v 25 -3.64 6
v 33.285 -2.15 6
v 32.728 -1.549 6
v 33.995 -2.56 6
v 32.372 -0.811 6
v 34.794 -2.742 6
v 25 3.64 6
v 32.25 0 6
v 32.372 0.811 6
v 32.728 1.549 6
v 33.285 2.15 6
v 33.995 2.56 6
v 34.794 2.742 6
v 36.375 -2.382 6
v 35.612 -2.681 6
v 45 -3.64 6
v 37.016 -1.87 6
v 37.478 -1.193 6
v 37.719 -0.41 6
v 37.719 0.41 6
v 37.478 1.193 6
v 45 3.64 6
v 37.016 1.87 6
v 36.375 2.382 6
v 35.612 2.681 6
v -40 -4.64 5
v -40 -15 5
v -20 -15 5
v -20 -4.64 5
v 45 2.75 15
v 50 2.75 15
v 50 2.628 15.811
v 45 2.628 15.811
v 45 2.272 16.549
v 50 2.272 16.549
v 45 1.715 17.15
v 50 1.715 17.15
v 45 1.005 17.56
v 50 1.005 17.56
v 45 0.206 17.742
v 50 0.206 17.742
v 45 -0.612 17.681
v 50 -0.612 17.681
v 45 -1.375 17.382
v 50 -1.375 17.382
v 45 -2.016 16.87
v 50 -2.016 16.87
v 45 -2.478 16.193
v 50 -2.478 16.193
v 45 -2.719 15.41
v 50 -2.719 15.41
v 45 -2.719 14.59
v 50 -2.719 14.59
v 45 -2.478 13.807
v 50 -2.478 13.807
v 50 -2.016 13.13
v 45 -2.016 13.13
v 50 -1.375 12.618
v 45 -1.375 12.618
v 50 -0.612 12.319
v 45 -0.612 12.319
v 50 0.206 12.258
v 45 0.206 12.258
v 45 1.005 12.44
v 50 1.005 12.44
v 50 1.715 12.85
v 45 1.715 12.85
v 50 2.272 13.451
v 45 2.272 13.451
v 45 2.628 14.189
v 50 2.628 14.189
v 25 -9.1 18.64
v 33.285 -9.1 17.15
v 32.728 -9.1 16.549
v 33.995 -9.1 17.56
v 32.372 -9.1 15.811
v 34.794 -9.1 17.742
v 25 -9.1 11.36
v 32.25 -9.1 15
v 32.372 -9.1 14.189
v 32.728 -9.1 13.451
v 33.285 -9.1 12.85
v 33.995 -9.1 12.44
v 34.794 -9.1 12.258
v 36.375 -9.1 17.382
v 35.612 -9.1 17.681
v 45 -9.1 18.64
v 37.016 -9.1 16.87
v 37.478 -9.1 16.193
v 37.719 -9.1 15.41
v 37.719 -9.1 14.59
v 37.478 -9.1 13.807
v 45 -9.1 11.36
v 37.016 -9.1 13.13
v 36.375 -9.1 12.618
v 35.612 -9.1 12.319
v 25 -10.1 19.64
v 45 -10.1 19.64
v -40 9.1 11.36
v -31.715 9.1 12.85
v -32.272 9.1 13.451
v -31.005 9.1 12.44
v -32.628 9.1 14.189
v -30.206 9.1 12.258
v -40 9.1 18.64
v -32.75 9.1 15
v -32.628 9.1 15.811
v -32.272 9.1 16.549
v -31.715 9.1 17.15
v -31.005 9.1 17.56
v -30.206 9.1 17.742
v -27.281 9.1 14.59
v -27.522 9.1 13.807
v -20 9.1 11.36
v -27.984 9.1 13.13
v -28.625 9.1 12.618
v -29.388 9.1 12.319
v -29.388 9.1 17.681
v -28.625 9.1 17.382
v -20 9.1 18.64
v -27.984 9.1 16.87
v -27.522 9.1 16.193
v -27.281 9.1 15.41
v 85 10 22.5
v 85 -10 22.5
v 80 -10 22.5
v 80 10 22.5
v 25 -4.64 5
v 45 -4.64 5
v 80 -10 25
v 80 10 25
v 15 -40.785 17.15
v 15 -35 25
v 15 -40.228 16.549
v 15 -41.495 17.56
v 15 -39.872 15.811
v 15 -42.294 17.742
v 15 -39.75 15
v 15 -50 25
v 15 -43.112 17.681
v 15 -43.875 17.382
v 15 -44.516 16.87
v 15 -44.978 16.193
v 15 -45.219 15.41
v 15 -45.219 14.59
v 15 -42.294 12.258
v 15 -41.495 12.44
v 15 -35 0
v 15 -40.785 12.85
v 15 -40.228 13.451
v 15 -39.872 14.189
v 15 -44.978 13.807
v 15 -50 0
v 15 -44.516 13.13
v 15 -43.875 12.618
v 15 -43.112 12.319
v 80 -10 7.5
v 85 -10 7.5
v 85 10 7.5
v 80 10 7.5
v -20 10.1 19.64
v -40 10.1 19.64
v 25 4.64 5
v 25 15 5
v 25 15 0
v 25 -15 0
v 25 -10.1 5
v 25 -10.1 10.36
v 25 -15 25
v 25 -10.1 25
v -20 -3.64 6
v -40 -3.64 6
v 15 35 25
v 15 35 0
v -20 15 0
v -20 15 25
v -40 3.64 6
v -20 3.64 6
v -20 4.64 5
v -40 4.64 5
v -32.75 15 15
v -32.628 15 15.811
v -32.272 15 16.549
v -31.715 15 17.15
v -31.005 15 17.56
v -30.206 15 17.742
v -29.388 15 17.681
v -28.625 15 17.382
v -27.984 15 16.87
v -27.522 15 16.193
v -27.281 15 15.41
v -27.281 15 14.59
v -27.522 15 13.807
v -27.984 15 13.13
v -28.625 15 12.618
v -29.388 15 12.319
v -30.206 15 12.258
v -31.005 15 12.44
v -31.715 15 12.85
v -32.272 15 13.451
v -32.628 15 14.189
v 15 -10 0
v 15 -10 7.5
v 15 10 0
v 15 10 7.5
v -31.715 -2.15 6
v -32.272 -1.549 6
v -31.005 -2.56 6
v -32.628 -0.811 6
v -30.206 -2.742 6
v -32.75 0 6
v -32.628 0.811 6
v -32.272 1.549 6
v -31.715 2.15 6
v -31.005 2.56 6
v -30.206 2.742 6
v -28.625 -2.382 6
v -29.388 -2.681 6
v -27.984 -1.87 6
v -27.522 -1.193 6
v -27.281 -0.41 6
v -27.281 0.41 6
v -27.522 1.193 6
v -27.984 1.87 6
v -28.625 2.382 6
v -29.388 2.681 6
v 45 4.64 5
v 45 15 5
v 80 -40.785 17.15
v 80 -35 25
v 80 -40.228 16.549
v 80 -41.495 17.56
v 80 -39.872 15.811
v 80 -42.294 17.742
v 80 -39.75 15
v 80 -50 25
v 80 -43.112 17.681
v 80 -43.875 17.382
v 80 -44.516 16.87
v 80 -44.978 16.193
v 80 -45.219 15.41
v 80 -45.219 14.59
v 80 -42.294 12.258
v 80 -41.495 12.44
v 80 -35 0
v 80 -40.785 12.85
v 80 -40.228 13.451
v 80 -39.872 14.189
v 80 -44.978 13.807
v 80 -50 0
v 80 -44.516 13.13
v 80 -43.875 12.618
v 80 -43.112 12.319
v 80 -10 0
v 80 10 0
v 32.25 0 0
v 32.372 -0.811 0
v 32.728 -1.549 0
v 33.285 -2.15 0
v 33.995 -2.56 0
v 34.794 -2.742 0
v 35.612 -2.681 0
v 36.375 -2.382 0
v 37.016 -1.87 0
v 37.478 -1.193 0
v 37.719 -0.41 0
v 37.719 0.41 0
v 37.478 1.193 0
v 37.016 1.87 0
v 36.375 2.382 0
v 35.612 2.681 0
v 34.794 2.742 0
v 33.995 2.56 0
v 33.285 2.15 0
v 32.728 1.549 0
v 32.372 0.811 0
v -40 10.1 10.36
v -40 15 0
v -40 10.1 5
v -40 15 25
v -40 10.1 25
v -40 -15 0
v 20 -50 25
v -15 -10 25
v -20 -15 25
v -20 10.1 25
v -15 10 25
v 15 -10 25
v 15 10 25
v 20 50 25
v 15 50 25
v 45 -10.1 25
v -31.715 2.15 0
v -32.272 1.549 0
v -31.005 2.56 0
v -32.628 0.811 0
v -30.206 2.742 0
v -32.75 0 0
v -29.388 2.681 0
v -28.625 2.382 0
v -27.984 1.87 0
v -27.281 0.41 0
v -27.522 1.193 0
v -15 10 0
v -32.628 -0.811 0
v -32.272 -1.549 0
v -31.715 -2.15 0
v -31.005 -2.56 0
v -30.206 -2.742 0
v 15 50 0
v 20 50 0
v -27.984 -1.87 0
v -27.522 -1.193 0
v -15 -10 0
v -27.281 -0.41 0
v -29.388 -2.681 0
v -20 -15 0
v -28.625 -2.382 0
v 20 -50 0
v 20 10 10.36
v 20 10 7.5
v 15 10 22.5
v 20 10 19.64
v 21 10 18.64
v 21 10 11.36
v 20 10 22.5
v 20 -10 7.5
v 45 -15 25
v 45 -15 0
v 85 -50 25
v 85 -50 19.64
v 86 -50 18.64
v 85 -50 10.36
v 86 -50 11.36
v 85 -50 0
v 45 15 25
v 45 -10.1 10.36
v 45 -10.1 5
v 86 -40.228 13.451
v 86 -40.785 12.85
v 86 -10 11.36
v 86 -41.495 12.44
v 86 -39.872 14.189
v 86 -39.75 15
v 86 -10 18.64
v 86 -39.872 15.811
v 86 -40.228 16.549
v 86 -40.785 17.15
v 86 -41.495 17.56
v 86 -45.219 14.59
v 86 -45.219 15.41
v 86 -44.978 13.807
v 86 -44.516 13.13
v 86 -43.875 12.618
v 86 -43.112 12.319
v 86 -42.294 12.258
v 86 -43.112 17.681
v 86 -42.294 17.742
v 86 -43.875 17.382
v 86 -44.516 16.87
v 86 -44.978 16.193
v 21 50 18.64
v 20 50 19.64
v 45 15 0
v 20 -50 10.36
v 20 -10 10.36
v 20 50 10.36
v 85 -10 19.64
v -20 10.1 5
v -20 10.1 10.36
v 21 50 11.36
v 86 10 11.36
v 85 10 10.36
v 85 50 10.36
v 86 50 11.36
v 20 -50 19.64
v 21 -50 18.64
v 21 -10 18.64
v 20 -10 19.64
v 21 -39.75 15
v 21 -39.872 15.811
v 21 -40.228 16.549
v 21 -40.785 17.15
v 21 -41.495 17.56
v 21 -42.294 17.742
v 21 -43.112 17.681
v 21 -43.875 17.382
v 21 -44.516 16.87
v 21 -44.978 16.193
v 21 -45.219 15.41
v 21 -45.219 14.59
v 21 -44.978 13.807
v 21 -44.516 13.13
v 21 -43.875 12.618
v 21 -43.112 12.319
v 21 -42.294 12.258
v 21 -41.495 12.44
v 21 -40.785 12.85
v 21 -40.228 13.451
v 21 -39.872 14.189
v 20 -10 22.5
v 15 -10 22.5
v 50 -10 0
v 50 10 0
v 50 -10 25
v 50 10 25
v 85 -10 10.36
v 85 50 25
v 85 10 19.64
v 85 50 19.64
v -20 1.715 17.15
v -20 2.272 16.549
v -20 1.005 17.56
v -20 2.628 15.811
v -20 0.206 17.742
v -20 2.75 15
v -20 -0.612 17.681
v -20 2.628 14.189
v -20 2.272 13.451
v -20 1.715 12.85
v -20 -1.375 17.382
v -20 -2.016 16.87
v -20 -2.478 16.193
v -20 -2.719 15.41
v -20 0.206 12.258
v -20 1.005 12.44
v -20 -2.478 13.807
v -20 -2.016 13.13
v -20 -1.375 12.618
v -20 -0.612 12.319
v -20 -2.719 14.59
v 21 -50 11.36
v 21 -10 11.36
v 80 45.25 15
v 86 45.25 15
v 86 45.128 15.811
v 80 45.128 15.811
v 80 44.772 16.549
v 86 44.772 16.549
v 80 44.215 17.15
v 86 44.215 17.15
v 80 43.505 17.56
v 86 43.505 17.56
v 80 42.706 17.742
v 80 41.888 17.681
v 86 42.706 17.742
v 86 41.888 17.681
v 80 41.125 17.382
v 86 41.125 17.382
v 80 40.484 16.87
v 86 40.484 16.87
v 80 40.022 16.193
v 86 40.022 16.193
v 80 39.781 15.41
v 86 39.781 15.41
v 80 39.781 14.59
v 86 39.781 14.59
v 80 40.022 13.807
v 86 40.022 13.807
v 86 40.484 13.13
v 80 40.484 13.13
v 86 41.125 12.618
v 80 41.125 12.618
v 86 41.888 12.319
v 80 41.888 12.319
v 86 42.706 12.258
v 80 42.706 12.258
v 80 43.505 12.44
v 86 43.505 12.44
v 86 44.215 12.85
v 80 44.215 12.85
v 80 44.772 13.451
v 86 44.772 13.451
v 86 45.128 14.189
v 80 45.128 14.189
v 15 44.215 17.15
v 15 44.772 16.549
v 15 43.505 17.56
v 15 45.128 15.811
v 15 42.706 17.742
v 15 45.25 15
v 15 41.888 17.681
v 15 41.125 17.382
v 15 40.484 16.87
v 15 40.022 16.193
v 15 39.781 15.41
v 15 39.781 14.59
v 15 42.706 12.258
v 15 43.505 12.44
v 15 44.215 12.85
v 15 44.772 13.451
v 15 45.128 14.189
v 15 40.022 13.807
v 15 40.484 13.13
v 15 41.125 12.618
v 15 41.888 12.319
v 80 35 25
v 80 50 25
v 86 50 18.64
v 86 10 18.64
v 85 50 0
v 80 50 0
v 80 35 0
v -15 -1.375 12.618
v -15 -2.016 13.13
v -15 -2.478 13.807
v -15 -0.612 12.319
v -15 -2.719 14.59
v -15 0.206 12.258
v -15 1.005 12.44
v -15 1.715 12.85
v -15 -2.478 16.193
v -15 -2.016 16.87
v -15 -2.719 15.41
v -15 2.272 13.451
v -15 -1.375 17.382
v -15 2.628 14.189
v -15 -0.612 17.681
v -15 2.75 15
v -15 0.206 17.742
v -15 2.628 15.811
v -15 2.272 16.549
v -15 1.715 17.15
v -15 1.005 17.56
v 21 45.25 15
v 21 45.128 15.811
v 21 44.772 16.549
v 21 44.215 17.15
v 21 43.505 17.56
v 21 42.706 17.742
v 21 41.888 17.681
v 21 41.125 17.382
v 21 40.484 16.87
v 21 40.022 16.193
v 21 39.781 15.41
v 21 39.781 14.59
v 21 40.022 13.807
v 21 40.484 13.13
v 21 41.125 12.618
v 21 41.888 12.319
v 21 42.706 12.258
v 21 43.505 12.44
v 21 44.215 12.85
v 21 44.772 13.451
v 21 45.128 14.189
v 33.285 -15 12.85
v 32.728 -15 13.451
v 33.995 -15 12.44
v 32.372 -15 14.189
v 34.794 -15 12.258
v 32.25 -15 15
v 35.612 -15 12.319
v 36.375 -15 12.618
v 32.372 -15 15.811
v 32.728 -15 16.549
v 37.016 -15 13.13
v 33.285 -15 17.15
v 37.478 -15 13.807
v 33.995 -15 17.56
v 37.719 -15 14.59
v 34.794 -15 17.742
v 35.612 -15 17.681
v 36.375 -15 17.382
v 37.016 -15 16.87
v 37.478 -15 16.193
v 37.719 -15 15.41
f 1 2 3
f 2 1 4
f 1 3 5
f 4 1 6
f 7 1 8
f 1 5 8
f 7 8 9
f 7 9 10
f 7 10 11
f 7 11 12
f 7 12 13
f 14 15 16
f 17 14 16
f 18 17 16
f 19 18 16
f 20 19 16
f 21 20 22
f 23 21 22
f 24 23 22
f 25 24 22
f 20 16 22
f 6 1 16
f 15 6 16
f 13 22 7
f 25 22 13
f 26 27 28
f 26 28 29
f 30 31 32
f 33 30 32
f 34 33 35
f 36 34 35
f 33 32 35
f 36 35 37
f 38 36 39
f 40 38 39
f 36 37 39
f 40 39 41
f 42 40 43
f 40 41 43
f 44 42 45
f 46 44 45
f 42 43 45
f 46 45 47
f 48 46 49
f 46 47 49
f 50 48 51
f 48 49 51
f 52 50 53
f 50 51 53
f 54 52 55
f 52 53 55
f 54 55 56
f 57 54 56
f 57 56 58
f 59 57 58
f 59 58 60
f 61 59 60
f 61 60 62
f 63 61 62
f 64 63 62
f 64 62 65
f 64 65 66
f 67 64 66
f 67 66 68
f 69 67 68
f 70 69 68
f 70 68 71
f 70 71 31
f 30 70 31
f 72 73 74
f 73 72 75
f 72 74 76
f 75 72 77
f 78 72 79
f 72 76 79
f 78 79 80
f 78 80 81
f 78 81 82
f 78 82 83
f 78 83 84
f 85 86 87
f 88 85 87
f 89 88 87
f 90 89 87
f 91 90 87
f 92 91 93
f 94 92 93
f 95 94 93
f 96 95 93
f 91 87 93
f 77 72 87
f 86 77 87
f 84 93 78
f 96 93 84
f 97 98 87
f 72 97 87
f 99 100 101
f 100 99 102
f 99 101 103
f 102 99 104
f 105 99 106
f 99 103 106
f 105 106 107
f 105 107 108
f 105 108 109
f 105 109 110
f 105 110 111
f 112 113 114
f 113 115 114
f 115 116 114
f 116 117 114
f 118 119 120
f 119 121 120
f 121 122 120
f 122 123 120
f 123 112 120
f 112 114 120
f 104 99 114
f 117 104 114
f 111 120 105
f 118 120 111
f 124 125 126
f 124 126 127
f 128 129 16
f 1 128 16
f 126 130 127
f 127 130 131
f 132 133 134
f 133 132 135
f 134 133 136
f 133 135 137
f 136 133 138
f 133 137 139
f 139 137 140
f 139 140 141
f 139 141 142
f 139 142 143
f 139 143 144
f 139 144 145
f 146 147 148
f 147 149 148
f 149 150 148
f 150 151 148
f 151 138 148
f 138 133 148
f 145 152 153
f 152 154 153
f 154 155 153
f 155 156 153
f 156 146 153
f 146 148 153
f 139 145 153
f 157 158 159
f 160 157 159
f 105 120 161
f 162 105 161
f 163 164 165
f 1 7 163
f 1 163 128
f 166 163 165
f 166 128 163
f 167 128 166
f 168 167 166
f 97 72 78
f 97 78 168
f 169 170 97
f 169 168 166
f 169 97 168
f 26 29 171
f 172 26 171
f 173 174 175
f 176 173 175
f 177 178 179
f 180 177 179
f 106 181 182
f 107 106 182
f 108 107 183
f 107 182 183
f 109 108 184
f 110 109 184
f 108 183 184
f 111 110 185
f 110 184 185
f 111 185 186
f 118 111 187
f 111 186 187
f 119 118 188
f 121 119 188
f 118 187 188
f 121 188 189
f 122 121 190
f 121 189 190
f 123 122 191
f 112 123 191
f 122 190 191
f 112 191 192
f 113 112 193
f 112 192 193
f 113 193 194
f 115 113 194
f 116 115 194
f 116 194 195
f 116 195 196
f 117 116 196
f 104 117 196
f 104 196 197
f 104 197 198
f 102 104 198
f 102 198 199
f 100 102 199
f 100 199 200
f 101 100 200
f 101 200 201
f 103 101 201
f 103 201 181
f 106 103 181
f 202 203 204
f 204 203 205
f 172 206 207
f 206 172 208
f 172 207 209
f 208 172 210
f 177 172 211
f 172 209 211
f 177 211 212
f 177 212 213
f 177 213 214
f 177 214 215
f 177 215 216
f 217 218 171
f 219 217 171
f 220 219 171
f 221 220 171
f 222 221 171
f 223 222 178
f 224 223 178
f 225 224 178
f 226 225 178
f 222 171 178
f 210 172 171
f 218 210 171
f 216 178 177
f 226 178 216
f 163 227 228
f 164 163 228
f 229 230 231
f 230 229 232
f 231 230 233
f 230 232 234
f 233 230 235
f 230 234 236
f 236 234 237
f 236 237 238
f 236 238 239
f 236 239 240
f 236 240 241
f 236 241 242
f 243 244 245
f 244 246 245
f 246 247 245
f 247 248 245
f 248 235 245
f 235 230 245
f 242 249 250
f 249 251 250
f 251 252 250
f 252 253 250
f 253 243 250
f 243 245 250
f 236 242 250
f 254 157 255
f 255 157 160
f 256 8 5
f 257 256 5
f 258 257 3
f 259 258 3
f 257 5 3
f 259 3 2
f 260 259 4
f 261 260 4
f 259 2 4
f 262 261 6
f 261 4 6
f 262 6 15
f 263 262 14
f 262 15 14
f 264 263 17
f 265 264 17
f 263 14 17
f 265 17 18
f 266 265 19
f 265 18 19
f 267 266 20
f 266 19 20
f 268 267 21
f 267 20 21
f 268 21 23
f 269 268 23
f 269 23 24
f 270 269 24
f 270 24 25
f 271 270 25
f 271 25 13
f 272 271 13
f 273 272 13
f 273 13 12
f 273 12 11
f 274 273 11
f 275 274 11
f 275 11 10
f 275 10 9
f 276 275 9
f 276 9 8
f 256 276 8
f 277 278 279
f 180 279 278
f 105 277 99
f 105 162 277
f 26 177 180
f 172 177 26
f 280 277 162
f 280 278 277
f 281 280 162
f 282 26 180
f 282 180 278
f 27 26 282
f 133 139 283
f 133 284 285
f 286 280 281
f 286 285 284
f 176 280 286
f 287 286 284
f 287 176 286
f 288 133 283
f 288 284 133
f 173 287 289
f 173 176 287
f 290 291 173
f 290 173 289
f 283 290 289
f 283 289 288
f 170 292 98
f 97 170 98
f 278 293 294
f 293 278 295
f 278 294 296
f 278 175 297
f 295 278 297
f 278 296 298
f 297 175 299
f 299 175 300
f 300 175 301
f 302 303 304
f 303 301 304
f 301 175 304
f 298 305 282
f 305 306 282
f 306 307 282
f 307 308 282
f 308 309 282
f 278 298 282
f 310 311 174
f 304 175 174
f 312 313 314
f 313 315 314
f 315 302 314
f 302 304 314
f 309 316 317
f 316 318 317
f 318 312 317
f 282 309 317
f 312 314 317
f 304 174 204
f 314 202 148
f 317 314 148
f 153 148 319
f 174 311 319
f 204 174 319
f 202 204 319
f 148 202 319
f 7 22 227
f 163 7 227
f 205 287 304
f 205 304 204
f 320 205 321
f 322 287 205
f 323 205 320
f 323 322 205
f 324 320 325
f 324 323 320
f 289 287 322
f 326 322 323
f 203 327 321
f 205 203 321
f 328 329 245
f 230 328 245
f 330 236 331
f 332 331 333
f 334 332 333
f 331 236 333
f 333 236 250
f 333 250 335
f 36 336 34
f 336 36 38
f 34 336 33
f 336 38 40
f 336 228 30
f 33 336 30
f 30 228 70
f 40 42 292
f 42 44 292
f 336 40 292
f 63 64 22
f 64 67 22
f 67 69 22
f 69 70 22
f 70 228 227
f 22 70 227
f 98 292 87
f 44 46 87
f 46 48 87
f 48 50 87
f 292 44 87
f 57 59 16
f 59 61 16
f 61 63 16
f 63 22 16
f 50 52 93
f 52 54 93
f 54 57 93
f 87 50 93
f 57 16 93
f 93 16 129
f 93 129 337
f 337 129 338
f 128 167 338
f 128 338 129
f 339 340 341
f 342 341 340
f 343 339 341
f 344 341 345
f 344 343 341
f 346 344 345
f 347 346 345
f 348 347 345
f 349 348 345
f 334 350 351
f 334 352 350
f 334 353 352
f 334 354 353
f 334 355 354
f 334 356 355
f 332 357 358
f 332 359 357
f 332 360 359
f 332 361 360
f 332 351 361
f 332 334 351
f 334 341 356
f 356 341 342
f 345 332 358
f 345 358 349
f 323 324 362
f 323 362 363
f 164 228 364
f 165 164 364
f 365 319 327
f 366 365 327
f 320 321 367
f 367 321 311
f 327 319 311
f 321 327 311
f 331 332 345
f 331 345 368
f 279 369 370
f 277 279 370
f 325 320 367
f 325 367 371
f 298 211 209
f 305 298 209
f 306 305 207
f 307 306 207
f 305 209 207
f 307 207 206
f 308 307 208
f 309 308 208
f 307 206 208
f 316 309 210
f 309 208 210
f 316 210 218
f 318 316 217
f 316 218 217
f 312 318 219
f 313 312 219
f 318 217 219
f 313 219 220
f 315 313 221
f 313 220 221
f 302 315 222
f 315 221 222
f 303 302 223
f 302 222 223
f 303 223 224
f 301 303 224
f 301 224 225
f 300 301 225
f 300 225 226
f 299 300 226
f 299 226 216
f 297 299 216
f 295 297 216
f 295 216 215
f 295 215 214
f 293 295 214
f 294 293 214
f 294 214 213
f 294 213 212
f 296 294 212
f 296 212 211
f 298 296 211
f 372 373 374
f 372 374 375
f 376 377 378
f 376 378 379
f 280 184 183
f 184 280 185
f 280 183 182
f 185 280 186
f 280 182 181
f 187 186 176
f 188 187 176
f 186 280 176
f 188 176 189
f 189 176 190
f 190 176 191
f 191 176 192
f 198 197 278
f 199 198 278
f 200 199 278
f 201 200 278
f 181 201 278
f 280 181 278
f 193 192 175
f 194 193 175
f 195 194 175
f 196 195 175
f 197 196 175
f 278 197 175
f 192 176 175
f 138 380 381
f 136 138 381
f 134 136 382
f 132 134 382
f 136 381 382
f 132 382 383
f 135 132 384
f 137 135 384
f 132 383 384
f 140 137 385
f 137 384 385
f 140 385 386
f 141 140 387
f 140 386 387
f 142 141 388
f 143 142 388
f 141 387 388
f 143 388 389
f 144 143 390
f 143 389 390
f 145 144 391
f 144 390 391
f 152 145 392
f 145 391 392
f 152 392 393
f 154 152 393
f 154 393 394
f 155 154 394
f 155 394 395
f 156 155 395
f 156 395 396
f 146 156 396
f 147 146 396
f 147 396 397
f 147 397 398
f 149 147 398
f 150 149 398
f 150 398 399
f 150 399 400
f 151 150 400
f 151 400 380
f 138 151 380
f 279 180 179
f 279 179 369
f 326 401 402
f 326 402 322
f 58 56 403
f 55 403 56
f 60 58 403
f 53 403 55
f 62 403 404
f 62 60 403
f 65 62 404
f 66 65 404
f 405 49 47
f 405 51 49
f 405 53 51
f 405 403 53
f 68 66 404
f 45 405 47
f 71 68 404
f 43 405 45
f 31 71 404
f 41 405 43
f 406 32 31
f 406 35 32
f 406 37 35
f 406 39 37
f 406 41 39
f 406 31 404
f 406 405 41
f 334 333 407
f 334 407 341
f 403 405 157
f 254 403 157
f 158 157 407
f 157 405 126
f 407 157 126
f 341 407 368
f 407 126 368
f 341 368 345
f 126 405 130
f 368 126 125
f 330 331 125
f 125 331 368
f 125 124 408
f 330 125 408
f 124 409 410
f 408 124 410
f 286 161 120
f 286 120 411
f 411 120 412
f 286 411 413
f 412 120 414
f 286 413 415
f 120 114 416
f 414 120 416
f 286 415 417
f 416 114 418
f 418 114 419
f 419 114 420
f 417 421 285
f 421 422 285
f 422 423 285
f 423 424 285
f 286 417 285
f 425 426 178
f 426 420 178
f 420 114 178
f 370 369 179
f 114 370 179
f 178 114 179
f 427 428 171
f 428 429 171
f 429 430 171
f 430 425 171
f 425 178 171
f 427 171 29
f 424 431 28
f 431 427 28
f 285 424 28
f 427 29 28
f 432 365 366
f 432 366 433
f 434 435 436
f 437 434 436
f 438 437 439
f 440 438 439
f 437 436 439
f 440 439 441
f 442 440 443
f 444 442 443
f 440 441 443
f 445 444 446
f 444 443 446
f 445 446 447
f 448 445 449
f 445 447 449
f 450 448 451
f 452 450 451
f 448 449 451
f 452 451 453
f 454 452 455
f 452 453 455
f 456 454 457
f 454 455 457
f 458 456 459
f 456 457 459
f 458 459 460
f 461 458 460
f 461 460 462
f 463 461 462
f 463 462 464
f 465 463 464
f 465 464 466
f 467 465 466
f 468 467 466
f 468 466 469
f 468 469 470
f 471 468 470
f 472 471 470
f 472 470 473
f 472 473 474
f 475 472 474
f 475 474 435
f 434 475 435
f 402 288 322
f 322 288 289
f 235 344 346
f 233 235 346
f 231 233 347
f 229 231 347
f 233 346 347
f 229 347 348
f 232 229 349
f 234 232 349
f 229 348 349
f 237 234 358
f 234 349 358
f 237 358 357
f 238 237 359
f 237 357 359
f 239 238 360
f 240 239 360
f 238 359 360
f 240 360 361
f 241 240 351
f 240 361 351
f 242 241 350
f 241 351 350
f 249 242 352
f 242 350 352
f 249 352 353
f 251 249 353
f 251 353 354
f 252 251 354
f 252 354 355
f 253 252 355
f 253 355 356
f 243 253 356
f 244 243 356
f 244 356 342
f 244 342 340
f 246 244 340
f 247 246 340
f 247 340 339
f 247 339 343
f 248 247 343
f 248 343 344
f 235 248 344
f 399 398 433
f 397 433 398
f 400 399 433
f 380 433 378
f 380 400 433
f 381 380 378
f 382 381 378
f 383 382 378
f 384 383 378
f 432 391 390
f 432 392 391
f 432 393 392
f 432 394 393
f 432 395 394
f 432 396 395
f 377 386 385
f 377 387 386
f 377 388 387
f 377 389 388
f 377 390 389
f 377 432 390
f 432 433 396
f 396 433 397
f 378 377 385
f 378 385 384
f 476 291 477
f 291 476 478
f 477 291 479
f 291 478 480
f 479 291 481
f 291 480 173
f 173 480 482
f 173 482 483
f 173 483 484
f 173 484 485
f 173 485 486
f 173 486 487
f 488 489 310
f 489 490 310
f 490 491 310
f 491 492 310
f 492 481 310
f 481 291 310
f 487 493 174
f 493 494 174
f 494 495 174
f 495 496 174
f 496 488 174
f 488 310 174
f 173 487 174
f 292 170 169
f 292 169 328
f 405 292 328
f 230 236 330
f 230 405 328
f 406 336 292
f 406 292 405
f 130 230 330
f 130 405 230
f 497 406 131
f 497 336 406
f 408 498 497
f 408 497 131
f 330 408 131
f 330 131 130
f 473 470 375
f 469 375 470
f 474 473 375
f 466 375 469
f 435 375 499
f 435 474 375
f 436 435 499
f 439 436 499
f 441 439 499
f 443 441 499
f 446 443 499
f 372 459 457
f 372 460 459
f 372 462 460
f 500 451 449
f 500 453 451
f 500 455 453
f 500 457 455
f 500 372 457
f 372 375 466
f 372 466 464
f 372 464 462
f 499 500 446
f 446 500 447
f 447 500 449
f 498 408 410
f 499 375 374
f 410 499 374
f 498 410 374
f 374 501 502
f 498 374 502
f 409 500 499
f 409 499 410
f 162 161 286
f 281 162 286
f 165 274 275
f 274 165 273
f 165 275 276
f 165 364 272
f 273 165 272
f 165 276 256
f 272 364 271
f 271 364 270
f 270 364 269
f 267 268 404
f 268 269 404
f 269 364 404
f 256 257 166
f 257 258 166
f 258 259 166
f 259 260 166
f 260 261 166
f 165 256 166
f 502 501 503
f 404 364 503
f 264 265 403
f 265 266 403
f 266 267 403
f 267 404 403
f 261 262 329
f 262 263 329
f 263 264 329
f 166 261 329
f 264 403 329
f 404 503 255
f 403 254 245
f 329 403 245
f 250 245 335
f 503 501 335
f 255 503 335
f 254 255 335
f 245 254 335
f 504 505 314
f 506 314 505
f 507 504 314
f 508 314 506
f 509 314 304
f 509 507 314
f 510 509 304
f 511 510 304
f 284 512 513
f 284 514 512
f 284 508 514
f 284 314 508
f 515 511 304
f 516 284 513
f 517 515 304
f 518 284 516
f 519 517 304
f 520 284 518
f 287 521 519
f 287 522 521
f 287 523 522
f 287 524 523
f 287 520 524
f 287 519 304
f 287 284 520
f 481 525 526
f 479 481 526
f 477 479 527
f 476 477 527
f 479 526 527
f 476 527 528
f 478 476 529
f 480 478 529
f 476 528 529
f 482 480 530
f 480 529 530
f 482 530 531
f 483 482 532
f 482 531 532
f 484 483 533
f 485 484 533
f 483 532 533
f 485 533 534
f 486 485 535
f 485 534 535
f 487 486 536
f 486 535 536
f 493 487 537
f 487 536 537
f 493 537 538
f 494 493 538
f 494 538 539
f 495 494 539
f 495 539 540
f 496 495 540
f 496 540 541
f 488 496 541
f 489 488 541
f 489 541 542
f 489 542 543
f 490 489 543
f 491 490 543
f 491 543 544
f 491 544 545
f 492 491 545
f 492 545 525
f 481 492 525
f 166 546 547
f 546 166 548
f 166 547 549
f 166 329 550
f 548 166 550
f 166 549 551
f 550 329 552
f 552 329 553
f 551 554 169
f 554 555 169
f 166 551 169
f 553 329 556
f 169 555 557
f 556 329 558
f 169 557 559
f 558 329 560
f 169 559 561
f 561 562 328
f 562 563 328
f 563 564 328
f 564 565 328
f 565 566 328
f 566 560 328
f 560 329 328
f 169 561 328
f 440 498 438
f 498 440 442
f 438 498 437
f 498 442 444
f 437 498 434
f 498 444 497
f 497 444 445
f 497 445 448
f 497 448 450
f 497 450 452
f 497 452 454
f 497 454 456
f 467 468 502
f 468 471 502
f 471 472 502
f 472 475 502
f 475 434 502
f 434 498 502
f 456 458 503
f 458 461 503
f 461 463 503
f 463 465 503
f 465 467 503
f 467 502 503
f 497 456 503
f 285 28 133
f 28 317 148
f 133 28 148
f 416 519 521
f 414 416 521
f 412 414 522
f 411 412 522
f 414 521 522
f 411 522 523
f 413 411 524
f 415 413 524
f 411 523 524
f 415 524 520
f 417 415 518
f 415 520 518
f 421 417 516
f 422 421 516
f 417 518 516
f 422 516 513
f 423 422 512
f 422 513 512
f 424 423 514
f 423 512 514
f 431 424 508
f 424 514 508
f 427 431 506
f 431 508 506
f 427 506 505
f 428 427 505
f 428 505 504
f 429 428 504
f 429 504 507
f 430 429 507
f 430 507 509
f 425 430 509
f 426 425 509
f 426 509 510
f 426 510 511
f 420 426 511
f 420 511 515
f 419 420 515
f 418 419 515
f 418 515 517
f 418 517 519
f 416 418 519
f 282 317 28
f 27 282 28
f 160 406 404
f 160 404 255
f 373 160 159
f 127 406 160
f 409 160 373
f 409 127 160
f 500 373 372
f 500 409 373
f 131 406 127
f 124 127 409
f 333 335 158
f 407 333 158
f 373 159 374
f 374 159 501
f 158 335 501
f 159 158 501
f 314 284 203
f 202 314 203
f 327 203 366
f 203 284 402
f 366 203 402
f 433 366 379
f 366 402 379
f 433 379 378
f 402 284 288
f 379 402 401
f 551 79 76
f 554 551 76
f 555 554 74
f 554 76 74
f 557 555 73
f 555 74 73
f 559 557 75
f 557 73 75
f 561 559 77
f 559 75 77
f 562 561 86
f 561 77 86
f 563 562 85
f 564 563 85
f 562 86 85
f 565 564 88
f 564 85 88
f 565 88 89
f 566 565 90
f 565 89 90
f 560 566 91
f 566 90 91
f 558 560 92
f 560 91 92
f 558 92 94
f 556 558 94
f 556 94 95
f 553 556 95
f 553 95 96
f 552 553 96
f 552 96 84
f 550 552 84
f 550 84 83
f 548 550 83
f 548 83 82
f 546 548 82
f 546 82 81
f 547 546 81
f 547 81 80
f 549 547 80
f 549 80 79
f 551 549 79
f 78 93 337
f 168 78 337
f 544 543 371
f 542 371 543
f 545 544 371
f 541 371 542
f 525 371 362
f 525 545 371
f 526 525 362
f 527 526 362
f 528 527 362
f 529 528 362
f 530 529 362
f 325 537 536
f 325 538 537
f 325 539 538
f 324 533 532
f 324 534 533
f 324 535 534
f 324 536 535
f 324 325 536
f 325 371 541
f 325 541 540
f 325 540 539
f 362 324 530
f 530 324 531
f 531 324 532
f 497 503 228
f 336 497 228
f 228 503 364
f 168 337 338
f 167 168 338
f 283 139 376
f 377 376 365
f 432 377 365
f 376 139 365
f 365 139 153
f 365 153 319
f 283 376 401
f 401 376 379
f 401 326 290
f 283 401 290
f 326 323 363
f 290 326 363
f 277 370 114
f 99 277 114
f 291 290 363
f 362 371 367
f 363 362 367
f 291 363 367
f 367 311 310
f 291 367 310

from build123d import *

# Parameters (mm, degrees)
F1_DEPTH      = 25
F3_DEPTH      = 100
F4_W          = 20
F4_H          = 3.86
F4_H_2        = 7.28
F5_DEPTH      = 35
F5_DEPTH_BACK = 10
F6_W          = 30
F6_H          = 20
F7_DEPTH      = 25.001
F10_D         = 5.5
F10_ON_F9_D   = 5.5
F12_DEPTH     = 20
F15_D         = 5.5
F15_ON_F13_D  = 5.5
F17_W         = 20
F17_H         = 20
F17_R         = 2.75
F18_DEPTH     = 5.9
F19_W         = 20
F19_H         = 20
F19_R         = 2.75
F20_DEPTH     = 5.9


with BuildPart() as f1:
    # F0 (on Top) → F1 (new body)
    with BuildSketch(Plane.XY):
        Polygon((15, -50), (20, -50), (20, 50), (15, 50), (15, 35), (-20, 15), (-20, 10), (-20, -10), (-20, -15), (15, -35), align=None)
    extrude(amount=F1_DEPTH)

    # F2 (on face) → F3 (join, through all)
    with BuildSketch(Plane.XZ.offset(50)):
        Polygon((21, 18.64), (20, 19.64), (20, 10.36), (21, 11.36), align=None)
    extrude(amount=-F3_DEPTH)

    # F4 (on face) → F5 (cut, two sides)
    with BuildSketch(Plane.YZ.offset(21)) as f5_sk:
        with Locations((0, 20.57)):
            Rectangle(F4_W, F4_H)
        with Locations((0, 9.43)):
            Rectangle(F4_W, F4_H)
        with Locations((0, 15)):
            Rectangle(F4_W, F4_H_2)
    extrude(amount=-F5_DEPTH, mode=Mode.SUBTRACT)
    extrude(f5_sk.sketch, amount=F5_DEPTH_BACK, mode=Mode.SUBTRACT)

    # F6 (on face) → F7 (cut, through all)
    with BuildSketch(Plane.XY.offset(25)):
        Rectangle(F6_W, F6_H)
    extrude(amount=-F7_DEPTH, mode=Mode.SUBTRACT)

    # F10 (through all)
    with Locations(Plane(origin=(15, 0, 0), x_dir=(0, -1, 0), z_dir=(-1, 0, 0))):
        with Locations((-42.5, 15), (42.5, 15)):
            Hole(F10_D / 2)

    # F10 on F9 (through all)
    with Locations(Plane(origin=(-20, 0, 0), x_dir=(0, -1, 0), z_dir=(-1, 0, 0))):
        with Locations((0, 15)):
            Hole(F10_ON_F9_D / 2)

    # F11 (on face) → F12 (join)
    with BuildSketch(Plane(origin=(-20, 0, 0), x_dir=(0, -1, 0), z_dir=(-1, 0, 0))):
        Polygon((-4.64, 5), (-10.1, 5), (-10.1, 10.36), (-10.1, 19.64), (-10.1, 25), (-15, 25), (-15, 0), (15, 0), (15, 25), (10.1, 25), (10.1, 19.64), (10.1, 10.36), (10.1, 5), (4.64, 5), align=None)
        Polygon((-10.1, 19.64), (-10.1, 10.36), (-9.1, 11.36), (-9.1, 18.64), align=None)
        Polygon((-3.64, 6), (-4.64, 5), (4.64, 5), (3.64, 6), align=None)
        Polygon((9.1, 11.36), (10.1, 10.36), (10.1, 19.64), (9.1, 18.64), align=None)
    extrude(amount=F12_DEPTH)

    # F15 (through all)
    with Locations(Plane.XZ.offset(15)):
        with Locations((-30, 15)):
            Hole(F15_D / 2)

    # F15 on F13 (through all)
    with Locations(Plane(origin=(0, 0, 0), x_dir=(1, 0, 0), z_dir=(0, 0, -1))):
        with Locations((-30, 0)):
            Hole(F15_ON_F13_D / 2)


with BuildPart() as f16_1:
    # F16: copy of F1
    add(f1.part.moved(Location((65, 0, 0))))

    # F19 (on face) → F20 (cut, through all)
    with BuildSketch(Plane(origin=(0, 15, 0), x_dir=(-1, 0, 0), z_dir=(0, 1, 0))):
        with Locations((-35, 15)):
            Rectangle(F19_W, F19_H)
        with Locations((-35, 15)):
            Circle(F19_R, mode=Mode.SUBTRACT)
    extrude(amount=-F20_DEPTH, mode=Mode.SUBTRACT)


with BuildPart() as f1_1:
    add(f1.part)

    # F17 (on face) → F18 (cut, through all)
    with BuildSketch(Plane.XZ.offset(15)):
        with Locations((-30, 15)):
            Rectangle(F17_W, F17_H)
        with Locations((-30, 15)):
            Circle(F17_R, mode=Mode.SUBTRACT)
    extrude(amount=-F18_DEPTH, mode=Mode.SUBTRACT)


solid = Compound([f16_1.part, f1_1.part])
